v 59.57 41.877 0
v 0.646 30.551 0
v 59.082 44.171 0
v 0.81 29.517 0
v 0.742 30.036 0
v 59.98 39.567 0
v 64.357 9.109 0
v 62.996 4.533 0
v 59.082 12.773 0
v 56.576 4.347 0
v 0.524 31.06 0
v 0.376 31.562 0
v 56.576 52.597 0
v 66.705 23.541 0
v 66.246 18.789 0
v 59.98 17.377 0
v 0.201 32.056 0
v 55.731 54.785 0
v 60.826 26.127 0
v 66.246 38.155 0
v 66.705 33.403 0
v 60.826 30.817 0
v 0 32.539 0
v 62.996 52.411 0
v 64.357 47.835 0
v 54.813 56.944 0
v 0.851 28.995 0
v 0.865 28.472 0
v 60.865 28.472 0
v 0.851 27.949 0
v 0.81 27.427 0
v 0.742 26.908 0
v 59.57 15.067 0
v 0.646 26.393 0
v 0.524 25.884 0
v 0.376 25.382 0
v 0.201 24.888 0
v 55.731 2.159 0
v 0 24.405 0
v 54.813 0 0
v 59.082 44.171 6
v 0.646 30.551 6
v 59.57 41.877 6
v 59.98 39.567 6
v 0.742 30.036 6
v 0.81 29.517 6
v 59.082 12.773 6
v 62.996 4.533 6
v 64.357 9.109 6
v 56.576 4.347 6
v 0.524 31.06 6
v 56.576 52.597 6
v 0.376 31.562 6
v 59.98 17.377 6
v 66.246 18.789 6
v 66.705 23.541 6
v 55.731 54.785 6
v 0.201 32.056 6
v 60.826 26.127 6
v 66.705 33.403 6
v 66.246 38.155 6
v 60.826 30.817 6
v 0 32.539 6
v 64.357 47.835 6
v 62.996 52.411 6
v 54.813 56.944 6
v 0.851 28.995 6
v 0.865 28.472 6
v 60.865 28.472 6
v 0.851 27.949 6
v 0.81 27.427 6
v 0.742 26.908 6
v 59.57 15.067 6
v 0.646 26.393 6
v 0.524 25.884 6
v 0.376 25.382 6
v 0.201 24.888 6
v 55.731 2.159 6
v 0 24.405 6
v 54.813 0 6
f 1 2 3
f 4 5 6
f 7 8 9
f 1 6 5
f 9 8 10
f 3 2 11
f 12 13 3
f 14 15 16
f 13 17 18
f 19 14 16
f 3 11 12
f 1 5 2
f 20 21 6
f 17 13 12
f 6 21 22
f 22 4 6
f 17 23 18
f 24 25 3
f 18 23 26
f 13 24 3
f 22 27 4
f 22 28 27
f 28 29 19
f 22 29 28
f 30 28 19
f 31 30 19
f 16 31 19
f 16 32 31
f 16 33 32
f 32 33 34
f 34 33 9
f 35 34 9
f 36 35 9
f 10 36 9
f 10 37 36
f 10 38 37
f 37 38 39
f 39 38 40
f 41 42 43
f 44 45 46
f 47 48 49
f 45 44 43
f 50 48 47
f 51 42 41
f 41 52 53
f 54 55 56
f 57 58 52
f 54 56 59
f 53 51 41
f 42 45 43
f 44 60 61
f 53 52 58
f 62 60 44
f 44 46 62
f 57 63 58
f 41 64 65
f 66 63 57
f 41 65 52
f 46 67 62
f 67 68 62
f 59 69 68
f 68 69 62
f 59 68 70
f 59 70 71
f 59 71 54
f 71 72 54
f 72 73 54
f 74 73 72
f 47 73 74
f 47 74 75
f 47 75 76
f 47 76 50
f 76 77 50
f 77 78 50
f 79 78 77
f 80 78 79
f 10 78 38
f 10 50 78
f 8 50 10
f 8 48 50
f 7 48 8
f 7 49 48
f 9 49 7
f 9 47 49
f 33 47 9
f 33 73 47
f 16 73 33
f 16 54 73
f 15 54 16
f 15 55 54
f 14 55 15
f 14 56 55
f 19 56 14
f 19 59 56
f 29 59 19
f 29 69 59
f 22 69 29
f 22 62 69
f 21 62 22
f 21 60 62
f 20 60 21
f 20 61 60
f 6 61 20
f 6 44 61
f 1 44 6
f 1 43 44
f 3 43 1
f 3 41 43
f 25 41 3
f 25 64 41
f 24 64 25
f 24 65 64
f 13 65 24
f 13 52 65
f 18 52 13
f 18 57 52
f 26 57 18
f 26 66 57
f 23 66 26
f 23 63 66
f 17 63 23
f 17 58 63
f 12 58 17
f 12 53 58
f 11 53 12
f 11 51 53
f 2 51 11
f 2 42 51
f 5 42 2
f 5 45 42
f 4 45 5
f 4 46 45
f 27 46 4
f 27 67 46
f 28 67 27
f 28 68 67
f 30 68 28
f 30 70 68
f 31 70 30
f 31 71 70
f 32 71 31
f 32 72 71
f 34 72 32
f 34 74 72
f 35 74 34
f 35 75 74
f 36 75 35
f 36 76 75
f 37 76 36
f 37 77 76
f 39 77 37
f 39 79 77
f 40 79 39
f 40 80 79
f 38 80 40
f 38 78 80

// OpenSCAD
$fn = 32;

// ----------------------------------------------------------------------
// Gear sector: 4 teeth on 48 degrees
// ----------------------------------------------------------------------

// --- parameters (mm) ---
sector_angle = 48;        // sector angle, degrees
root_r = 70;              // root circle radius
tooth_h = 6;              // tooth height over the root circle
teeth = 4;                // number of teeth on the sector
hub_r = 10;               // hub bore radius
plate_t = 6;              // sector thickness, Z
arc_step = 3;             // sampling step of the root/hub arcs, degrees

tip_r = root_r + tooth_h;  // tip circle radius

profile = [[54.813, 0], [55.731, 2.159], [56.576, 4.347], [62.996, 4.533], [64.357, 9.109], [59.082, 12.773], [59.57, 15.067], [59.98, 17.377], [66.246, 18.789], [66.705, 23.541], [60.826, 26.127], [60.865, 28.472], [60.826, 30.817], [66.705, 33.403], [66.246, 38.155], [59.98, 39.567], [59.57, 41.877], [59.082, 44.171], [64.357, 47.835], [62.996, 52.411], [56.576, 52.597], [55.731, 54.785], [54.813, 56.944], [0, 32.539], [0.201, 32.056], [0.376, 31.562], [0.524, 31.06], [0.646, 30.551], [0.742, 30.036], [0.81, 29.517], [0.851, 28.995], [0.865, 28.472], [0.851, 27.949], [0.81, 27.427], [0.742, 26.908], [0.646, 26.393], [0.524, 25.884], [0.376, 25.382], [0.201, 24.888], [0, 24.405]];  // primary outline, 40 points, counter clockwise

// --- the one profile operation ---
linear_extrude(height = plate_t) polygon(points = profile);
